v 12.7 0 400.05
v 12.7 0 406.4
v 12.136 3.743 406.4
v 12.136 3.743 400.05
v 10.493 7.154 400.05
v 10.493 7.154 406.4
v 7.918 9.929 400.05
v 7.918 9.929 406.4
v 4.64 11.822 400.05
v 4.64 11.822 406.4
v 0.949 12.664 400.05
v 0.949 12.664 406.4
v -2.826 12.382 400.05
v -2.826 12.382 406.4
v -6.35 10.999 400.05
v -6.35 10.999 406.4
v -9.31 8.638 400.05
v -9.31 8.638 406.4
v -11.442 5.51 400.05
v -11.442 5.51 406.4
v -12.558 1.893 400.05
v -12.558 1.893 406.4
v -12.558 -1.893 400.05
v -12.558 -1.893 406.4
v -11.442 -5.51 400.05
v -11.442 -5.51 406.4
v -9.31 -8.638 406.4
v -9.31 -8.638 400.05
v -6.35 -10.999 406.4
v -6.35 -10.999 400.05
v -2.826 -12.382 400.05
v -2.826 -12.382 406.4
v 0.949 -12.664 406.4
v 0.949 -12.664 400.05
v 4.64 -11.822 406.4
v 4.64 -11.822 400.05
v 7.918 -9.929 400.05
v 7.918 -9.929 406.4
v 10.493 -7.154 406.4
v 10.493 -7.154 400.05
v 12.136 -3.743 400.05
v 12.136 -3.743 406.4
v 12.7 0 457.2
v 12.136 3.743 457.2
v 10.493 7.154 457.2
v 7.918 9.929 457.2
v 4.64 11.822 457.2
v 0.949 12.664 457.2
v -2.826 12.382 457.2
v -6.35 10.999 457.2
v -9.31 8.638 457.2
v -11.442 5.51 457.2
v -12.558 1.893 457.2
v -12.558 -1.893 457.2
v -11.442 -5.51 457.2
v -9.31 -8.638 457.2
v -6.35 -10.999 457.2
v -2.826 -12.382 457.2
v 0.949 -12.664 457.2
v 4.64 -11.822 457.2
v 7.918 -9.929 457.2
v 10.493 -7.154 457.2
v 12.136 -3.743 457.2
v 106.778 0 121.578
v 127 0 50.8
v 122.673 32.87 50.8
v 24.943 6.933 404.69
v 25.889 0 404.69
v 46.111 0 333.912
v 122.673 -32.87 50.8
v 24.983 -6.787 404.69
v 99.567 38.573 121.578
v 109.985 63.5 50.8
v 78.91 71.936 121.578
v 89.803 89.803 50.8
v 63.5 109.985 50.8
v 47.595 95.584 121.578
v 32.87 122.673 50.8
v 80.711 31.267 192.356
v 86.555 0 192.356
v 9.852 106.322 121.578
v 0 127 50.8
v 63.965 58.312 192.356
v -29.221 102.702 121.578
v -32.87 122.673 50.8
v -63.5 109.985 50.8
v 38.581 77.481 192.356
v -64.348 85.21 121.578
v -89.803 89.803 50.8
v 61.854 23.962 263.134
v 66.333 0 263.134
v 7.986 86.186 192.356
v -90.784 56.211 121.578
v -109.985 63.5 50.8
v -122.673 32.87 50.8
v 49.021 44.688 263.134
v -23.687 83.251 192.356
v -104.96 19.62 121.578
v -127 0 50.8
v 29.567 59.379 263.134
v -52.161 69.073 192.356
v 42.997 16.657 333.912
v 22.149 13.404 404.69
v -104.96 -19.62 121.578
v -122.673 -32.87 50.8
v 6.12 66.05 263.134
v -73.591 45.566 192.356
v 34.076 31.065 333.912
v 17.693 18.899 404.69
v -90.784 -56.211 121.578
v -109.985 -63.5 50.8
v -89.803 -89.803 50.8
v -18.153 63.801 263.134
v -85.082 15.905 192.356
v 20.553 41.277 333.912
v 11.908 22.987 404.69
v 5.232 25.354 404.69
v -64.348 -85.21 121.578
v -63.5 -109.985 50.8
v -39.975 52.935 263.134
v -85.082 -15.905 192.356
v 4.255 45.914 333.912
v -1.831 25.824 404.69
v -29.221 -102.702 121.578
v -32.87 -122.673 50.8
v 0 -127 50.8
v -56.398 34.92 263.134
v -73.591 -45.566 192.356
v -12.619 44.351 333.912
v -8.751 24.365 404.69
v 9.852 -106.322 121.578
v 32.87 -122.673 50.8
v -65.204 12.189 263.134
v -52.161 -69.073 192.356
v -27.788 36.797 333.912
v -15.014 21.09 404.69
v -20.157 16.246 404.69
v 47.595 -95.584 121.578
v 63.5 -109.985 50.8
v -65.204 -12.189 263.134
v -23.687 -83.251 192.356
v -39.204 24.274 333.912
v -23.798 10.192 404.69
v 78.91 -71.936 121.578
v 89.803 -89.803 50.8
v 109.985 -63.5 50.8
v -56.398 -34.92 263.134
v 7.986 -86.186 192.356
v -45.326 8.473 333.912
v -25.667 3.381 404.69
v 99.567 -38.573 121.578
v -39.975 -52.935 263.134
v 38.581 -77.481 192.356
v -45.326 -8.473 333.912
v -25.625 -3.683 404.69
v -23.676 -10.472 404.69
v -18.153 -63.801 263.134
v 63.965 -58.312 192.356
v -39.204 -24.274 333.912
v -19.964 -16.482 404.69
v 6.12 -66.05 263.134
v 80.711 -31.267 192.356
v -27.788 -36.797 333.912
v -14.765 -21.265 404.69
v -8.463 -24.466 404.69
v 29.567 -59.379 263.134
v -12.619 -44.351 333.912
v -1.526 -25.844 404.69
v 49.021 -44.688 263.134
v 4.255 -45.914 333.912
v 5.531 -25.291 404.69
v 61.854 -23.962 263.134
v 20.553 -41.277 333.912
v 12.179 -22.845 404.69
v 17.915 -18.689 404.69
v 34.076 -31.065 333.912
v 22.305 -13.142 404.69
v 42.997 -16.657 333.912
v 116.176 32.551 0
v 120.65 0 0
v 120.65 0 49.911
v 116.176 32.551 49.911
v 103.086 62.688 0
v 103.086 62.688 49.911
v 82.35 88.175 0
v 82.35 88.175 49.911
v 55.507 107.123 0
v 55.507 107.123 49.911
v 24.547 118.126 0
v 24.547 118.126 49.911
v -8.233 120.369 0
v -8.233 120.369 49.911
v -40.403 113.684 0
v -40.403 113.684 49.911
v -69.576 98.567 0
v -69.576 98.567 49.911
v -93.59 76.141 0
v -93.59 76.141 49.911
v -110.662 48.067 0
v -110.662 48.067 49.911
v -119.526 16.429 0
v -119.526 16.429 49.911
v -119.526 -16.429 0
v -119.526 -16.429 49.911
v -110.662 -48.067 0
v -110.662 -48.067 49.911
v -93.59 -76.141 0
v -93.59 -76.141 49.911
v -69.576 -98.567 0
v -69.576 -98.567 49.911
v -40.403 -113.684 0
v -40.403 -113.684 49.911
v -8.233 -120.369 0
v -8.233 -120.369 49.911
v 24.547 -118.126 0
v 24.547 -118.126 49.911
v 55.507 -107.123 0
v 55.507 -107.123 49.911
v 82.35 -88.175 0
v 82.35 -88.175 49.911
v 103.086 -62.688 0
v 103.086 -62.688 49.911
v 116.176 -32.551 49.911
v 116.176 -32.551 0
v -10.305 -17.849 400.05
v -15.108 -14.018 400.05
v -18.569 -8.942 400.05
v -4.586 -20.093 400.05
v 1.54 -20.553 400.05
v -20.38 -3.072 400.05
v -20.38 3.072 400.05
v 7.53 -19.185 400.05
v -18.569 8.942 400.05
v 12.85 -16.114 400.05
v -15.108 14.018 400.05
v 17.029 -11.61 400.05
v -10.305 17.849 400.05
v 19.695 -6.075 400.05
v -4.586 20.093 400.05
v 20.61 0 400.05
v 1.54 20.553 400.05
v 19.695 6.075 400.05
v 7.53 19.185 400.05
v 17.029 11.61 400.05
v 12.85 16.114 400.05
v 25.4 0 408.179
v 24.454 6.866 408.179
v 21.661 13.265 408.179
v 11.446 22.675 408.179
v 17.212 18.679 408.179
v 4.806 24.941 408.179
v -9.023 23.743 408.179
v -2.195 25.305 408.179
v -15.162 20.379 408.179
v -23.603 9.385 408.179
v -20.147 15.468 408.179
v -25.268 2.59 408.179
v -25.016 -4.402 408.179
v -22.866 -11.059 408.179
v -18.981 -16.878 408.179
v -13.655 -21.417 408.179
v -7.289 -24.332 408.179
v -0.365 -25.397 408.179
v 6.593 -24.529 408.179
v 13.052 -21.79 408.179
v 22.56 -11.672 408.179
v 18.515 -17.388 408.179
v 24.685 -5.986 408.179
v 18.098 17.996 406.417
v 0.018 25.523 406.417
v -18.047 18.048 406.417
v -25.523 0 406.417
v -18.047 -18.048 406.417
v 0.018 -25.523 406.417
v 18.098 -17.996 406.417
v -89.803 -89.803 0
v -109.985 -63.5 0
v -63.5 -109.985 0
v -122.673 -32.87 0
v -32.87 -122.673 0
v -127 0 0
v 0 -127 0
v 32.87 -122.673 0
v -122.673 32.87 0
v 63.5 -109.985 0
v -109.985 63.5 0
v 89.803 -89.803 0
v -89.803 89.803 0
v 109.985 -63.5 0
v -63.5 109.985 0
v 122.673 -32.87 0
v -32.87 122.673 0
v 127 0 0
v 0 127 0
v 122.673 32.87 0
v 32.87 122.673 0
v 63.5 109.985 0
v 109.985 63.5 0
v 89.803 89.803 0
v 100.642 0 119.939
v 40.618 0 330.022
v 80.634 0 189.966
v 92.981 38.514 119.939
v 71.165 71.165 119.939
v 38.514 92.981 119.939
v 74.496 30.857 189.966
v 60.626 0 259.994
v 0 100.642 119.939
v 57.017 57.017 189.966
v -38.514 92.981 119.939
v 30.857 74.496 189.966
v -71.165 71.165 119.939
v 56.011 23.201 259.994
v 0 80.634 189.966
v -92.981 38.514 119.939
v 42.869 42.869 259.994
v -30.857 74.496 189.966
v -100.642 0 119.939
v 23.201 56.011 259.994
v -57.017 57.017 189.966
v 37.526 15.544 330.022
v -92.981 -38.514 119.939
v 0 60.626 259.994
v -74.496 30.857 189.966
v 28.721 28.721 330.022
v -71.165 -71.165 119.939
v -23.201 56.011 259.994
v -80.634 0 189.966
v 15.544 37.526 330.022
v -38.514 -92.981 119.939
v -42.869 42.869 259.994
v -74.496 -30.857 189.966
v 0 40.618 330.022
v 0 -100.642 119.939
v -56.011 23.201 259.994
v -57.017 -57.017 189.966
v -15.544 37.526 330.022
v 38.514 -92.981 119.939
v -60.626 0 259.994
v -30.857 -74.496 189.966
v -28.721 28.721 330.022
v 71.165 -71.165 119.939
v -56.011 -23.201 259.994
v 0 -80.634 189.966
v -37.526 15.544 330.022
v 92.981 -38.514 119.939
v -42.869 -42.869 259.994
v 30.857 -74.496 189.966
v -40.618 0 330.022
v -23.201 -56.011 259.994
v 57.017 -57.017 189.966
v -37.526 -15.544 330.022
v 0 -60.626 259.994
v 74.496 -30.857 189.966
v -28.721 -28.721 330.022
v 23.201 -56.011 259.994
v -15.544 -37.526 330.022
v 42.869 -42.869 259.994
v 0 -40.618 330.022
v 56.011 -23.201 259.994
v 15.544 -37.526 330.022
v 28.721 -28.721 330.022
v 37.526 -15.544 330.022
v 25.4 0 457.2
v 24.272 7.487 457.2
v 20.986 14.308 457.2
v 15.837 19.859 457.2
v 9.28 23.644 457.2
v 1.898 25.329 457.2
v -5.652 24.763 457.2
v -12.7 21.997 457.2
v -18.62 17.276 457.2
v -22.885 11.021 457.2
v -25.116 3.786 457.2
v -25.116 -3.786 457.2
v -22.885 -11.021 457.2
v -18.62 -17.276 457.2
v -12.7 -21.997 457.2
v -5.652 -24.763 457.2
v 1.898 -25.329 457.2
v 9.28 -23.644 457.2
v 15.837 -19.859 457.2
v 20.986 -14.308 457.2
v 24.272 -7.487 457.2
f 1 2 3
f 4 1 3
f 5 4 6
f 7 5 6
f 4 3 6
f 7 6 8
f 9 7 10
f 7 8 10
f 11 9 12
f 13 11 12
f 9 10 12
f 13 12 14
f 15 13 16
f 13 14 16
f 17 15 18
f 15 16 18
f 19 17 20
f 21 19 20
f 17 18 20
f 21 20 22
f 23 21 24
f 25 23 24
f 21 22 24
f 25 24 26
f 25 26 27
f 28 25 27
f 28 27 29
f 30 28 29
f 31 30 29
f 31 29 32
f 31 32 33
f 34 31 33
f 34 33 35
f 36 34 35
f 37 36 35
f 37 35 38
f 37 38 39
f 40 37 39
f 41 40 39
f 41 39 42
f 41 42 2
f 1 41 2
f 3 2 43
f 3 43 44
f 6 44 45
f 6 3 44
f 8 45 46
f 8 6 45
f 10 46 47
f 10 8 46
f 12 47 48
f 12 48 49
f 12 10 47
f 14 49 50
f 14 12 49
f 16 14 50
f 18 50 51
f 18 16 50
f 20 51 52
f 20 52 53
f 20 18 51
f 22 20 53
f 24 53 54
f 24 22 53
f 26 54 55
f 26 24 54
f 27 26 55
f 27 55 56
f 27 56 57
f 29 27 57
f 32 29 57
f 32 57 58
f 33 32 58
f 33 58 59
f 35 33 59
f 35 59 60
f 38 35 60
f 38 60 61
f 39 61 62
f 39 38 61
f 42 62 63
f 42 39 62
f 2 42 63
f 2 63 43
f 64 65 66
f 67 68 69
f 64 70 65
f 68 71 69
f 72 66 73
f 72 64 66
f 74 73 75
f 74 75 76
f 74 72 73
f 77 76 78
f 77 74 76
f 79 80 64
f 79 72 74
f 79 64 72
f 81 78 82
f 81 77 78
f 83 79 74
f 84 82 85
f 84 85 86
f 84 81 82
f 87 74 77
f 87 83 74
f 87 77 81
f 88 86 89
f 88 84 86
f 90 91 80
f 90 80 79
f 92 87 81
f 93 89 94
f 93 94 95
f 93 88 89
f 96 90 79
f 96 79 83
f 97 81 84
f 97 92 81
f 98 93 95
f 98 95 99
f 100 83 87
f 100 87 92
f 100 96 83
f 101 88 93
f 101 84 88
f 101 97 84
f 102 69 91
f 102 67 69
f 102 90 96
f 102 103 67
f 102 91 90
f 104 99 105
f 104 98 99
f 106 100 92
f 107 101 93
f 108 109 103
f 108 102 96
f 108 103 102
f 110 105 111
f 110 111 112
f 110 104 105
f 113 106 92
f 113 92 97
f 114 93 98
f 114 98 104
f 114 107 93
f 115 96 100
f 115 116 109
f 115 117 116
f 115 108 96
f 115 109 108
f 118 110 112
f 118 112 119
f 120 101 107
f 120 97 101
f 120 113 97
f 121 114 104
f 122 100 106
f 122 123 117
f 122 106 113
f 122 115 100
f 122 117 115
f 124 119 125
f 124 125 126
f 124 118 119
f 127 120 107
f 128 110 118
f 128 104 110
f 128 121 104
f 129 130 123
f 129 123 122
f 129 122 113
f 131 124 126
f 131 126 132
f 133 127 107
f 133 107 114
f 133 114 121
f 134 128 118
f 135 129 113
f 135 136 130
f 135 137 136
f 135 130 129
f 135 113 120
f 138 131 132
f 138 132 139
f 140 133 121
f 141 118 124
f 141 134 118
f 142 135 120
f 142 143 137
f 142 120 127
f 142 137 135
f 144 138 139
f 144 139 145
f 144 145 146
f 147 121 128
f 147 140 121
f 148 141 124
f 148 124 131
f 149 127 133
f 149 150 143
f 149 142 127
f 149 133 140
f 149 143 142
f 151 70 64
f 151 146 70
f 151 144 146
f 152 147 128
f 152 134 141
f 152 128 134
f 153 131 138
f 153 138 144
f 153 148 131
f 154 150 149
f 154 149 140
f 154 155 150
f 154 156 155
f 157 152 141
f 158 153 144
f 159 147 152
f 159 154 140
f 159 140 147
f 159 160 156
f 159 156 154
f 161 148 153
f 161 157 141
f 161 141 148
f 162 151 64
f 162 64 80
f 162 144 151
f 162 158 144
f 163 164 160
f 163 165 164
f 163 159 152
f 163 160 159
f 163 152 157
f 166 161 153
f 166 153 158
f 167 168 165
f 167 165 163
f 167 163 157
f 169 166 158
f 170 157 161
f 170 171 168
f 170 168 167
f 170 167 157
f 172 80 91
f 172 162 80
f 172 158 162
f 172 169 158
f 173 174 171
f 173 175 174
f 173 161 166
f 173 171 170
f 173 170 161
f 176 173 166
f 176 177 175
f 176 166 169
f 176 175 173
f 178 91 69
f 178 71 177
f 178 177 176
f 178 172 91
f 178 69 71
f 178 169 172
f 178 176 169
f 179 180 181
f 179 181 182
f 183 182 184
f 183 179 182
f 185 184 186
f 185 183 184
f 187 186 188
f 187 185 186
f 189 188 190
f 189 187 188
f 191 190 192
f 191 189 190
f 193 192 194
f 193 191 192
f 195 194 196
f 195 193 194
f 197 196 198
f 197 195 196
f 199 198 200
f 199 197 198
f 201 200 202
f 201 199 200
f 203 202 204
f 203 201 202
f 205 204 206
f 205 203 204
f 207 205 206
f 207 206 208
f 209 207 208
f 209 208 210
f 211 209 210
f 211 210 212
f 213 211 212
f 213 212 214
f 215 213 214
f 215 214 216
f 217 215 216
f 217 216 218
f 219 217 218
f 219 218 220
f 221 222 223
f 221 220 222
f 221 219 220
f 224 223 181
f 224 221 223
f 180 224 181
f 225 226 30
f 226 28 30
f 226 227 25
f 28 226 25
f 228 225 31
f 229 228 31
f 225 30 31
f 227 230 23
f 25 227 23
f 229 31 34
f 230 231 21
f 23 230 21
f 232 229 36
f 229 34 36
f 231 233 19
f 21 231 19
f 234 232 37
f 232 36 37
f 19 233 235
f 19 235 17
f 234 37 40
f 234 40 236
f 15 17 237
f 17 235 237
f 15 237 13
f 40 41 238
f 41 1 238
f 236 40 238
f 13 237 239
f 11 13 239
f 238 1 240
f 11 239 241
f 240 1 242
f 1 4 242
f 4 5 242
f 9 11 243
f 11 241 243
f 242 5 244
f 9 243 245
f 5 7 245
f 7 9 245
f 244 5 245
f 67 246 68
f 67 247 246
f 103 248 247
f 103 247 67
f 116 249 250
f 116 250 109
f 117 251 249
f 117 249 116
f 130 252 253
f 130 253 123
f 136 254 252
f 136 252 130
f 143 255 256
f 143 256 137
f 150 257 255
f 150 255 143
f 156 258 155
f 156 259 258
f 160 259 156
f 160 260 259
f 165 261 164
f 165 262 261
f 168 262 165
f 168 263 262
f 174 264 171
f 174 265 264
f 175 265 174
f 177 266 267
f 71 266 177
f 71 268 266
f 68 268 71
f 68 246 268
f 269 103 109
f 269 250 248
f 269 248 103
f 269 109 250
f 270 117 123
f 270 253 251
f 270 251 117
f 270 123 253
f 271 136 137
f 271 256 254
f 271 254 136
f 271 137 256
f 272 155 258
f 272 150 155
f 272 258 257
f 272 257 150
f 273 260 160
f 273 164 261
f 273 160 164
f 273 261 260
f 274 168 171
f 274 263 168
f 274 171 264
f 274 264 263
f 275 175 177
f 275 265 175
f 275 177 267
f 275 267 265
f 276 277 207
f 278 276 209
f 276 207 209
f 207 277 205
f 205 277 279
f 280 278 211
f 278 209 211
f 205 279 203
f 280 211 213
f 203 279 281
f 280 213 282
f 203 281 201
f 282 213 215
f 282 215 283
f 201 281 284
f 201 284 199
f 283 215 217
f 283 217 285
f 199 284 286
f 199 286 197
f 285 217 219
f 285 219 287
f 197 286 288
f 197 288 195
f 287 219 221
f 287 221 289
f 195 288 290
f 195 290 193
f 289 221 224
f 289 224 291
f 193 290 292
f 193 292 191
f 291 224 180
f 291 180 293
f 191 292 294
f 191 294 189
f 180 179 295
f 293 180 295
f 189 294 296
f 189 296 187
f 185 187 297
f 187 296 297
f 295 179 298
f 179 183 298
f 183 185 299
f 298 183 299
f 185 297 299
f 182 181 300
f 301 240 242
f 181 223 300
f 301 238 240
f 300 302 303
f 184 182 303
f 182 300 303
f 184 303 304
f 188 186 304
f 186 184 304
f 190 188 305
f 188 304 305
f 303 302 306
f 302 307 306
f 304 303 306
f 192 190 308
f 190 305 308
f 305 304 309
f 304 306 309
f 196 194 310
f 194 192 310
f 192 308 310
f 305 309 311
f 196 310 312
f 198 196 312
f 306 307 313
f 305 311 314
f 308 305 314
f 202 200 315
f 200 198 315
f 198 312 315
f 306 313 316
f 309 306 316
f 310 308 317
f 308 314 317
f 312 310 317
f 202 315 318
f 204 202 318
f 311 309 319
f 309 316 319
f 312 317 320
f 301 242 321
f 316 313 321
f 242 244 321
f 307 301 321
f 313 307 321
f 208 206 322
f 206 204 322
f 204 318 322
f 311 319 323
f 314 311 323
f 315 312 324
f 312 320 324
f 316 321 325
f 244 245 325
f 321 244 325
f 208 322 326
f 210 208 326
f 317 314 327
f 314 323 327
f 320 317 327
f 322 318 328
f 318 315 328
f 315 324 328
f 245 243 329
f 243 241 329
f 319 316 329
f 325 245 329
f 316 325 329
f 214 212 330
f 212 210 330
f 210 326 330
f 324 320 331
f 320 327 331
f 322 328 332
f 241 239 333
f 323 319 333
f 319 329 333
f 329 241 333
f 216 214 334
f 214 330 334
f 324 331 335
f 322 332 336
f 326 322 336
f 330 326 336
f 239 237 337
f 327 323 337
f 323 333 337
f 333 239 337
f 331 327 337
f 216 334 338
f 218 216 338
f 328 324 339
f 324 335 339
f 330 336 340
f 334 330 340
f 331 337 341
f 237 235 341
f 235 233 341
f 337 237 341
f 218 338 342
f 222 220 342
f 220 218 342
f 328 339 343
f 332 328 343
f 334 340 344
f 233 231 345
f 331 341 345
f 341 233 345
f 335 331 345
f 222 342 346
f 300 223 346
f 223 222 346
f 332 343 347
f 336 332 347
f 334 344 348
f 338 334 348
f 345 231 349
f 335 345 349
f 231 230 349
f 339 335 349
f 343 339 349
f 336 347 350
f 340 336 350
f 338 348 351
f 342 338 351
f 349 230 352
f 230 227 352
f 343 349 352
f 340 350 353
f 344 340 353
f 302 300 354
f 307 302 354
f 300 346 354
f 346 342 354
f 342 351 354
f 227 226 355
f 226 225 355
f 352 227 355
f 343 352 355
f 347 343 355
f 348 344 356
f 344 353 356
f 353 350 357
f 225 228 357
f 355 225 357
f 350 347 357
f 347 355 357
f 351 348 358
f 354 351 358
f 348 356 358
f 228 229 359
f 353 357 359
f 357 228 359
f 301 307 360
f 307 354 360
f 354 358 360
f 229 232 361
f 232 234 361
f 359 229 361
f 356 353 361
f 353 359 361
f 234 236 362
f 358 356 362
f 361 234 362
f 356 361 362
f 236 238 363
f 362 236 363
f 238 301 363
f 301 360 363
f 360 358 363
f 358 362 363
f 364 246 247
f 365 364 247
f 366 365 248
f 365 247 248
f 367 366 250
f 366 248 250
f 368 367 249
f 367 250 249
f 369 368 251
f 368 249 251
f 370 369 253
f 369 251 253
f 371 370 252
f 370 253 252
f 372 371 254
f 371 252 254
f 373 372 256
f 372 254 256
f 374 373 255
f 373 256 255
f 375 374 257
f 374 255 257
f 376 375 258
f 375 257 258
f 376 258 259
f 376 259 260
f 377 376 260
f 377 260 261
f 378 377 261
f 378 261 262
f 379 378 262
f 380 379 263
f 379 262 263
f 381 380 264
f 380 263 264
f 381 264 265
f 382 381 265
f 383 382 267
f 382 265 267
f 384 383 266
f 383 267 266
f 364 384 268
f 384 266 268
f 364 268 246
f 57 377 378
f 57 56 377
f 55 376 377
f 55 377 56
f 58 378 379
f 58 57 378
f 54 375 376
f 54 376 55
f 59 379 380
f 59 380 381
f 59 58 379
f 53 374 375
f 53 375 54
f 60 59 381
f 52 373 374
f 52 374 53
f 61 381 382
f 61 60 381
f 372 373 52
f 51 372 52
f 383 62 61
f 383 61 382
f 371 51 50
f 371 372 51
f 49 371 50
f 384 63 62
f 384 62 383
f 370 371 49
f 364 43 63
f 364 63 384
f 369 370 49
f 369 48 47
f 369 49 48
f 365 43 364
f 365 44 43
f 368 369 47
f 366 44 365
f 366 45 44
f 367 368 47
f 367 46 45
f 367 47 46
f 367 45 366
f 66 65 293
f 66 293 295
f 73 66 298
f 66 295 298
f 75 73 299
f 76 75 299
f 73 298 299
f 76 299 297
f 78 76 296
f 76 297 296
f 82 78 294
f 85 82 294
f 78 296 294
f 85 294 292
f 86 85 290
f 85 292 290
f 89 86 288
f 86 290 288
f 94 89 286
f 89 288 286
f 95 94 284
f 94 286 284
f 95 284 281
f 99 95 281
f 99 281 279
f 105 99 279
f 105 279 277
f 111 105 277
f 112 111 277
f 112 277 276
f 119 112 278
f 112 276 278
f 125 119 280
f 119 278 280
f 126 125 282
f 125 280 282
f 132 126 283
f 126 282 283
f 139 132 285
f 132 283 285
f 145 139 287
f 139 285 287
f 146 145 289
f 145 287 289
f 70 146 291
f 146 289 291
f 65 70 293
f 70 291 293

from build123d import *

# Parameters (mm, degrees)
F0_R     = 127
F1_DEPTH = 406.4
F2_SIZE2 = 101.6
F2_SIZE  = 355.6
F3_T     = -6.35
F4_R     = 12.7
F5_DEPTH = 25.4
F6_R     = 25.4
F6_R_2   = 12.7
F7_DEPTH = 50.8
F8_R     = 12.7


with BuildPart() as f1:
    # F0 (on Top) → F1 (new body)
    with BuildSketch(Plane.XY):
        Circle(F0_R)
    extrude(amount=F1_DEPTH)

    # F2
    f2_edges = [f1.edges().sort_by_distance(p)[0] for p in [
        (-127, 0, 406.4),
    ]]
    f2_side = f1.faces().sort_by_distance((-127, 0, 203.2))[0]
    chamfer(f2_edges, length=F2_SIZE, length2=F2_SIZE2, reference=f2_side)

    # F3
    f3_openings = [f1.faces().sort_by_distance(p)[0] for p in [
        (0, 0, 0),
    ]]
    offset(amount=F3_T, openings=f3_openings)

    # F4 (on face) → F5 (cut)
    with BuildSketch(Plane.XY.offset(406.4)):
        Circle(F4_R)
    extrude(amount=-F5_DEPTH, mode=Mode.SUBTRACT)

    # F6 (on face) → F7 (join)
    with BuildSketch(Plane.XY.offset(406.4)):
        Circle(F6_R)
        Circle(F6_R_2, mode=Mode.SUBTRACT)
    extrude(amount=F7_DEPTH)

    # F8
    f8_edges = [f1.edges().sort_by_distance(p)[0] for p in [
        (-25.4, 0, 406.4),
    ]]
    fillet(f8_edges, radius=F8_R)


solid = f1.part
